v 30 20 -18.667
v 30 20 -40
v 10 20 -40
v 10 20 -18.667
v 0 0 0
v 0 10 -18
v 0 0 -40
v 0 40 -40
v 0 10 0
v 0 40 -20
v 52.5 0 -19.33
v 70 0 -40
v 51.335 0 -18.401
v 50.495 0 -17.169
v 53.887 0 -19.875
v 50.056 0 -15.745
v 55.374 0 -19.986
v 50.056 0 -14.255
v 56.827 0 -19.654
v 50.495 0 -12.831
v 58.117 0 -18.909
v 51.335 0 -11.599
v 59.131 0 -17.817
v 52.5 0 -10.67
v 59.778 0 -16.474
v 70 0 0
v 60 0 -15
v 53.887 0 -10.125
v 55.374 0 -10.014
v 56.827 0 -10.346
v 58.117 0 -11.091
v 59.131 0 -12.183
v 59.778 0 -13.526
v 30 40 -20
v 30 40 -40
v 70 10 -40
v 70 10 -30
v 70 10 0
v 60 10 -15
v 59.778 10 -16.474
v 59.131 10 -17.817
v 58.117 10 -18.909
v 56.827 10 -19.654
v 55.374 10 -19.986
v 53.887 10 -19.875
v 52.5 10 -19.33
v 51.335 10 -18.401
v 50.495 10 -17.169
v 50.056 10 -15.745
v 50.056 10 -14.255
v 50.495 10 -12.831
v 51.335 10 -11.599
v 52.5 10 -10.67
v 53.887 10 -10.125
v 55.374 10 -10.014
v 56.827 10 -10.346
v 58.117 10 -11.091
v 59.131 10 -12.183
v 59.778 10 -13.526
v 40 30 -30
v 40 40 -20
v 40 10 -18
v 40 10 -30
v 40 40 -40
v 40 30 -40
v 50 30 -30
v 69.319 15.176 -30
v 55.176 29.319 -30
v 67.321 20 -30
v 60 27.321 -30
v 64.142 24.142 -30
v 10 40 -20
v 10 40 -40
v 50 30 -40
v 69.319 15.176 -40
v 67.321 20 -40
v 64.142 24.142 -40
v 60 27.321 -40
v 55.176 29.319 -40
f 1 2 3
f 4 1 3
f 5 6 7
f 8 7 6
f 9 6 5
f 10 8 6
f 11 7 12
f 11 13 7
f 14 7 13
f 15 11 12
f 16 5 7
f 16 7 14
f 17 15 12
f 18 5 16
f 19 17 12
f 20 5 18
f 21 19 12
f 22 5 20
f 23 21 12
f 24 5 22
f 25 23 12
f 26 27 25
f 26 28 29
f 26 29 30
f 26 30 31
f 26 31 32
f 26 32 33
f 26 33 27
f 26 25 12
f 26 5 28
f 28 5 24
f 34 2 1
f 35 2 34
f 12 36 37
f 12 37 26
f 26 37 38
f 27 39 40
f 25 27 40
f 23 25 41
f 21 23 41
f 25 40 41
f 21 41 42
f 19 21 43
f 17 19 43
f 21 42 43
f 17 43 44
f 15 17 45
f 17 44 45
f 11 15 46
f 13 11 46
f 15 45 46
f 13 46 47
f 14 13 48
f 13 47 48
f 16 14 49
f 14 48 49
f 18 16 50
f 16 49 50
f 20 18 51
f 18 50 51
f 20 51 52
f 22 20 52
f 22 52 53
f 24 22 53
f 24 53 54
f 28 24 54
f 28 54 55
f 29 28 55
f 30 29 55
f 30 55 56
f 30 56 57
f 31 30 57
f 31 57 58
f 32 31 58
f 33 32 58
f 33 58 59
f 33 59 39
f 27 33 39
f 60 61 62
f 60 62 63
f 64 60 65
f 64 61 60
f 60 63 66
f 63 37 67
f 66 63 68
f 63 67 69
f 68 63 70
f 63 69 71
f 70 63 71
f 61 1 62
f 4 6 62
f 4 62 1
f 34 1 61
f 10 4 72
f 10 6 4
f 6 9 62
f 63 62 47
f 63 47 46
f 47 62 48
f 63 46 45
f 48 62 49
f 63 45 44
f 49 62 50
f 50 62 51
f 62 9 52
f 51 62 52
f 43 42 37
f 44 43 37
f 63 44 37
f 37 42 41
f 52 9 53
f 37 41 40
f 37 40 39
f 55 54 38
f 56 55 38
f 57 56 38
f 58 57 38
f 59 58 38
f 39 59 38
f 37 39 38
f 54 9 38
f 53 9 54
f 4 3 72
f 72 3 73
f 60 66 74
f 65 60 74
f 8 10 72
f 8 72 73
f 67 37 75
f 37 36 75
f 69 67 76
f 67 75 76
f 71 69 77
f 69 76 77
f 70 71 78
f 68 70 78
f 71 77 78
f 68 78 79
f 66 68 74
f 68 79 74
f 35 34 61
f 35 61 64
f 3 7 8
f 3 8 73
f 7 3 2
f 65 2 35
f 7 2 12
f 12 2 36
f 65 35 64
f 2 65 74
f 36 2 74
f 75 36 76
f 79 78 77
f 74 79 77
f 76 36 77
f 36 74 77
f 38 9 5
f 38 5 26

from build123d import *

# Parameters (mm, degrees)
BOSS_EXTRUDE1_DEPTH            = 40
SKETCH2_W                      = 40
SKETCH2_H                      = 30
BOSS_EXTRUDE2_DEPTH            = 20
BOSS_EXTRUDE3_DEPTH            = 30
CUT_EXTRUDE1_DEPTH             = 30
SKETCH5_W                      = 70
SKETCH5_H                      = 40
BOSS_EXTRUDE4_DEPTH            = 10
SKETCH6_W                      = 20
SKETCH6_H                      = 20
CUT_EXTRUDE2_DEPTH             = 41
F_10_0_10_DIAMETER_HOLE1_D     = 10
F_10_0_10_DIAMETER_HOLE1_DEPTH = 40
FILLET1_R                      = 20


with BuildPart() as part:
    # Sketch1 → Boss-Extrude1 (new body)
    with BuildSketch(Plane(origin=(0, 0, 0), x_dir=(0, -1, 0), z_dir=(-1, 0, 0))):
        Polygon((-10, -18), (-40, -20), (-10, -20), align=None)
    extrude(amount=-BOSS_EXTRUDE1_DEPTH)

    # Sketch2 → Boss-Extrude2 (add)
    with BuildSketch(Plane(origin=(0, 0, -20), x_dir=(-1, 0, 0), z_dir=(0, 0, -1))):
        with Locations((-20, 25)):
            Rectangle(SKETCH2_W, SKETCH2_H)
    extrude(amount=BOSS_EXTRUDE2_DEPTH)

    # Sketch3 → Boss-Extrude3 (add)
    with BuildSketch(Plane(origin=(40, 0, 0), x_dir=(0, 0, -1), z_dir=(1, 0, 0))):
        Polygon((40, 10), (0, 10), (20, 40), (40, 40), align=None)
    extrude(amount=BOSS_EXTRUDE3_DEPTH)

    # Sketch4 → Cut-Extrude1 (cut)
    with BuildSketch(Plane(origin=(70, 0, 0), x_dir=(0, 0, -1), z_dir=(1, 0, 0))):
        Polygon((20, 40), (0, 10), (30, 10), (30, 30), (40, 30), (40, 40), align=None)
    extrude(amount=-CUT_EXTRUDE1_DEPTH, mode=Mode.SUBTRACT)

    # Sketch5 → Boss-Extrude4 (add)
    with BuildSketch(Plane.XZ.offset(-10)):
        with Locations((35, -20)):
            Rectangle(SKETCH5_W, SKETCH5_H)
    extrude(amount=BOSS_EXTRUDE4_DEPTH)

    # Sketch6 → Cut-Extrude2 (cut, through all)
    with BuildSketch(Plane(origin=(0, 0, -40), x_dir=(-1, 0, 0), z_dir=(0, 0, -1))):
        with Locations((-20, 30)):
            Rectangle(SKETCH6_W, SKETCH6_H)
    extrude(amount=-CUT_EXTRUDE2_DEPTH, mode=Mode.SUBTRACT)

    # Ø10.0 (10) Diameter Hole1
    with Locations(Plane(origin=(0, 0, 0), x_dir=(-1, 0, 0), z_dir=(0, -1, 0))):
        with Locations((-55, 15)):
            Hole(F_10_0_10_DIAMETER_HOLE1_D / 2, depth=F_10_0_10_DIAMETER_HOLE1_DEPTH)

    # Fillet1
    fillet1_edges = [part.edges().sort_by_distance(p)[0] for p in [
        (70, 30, -35),
    ]]
    fillet(fillet1_edges, radius=FILLET1_R)


solid = part.part
